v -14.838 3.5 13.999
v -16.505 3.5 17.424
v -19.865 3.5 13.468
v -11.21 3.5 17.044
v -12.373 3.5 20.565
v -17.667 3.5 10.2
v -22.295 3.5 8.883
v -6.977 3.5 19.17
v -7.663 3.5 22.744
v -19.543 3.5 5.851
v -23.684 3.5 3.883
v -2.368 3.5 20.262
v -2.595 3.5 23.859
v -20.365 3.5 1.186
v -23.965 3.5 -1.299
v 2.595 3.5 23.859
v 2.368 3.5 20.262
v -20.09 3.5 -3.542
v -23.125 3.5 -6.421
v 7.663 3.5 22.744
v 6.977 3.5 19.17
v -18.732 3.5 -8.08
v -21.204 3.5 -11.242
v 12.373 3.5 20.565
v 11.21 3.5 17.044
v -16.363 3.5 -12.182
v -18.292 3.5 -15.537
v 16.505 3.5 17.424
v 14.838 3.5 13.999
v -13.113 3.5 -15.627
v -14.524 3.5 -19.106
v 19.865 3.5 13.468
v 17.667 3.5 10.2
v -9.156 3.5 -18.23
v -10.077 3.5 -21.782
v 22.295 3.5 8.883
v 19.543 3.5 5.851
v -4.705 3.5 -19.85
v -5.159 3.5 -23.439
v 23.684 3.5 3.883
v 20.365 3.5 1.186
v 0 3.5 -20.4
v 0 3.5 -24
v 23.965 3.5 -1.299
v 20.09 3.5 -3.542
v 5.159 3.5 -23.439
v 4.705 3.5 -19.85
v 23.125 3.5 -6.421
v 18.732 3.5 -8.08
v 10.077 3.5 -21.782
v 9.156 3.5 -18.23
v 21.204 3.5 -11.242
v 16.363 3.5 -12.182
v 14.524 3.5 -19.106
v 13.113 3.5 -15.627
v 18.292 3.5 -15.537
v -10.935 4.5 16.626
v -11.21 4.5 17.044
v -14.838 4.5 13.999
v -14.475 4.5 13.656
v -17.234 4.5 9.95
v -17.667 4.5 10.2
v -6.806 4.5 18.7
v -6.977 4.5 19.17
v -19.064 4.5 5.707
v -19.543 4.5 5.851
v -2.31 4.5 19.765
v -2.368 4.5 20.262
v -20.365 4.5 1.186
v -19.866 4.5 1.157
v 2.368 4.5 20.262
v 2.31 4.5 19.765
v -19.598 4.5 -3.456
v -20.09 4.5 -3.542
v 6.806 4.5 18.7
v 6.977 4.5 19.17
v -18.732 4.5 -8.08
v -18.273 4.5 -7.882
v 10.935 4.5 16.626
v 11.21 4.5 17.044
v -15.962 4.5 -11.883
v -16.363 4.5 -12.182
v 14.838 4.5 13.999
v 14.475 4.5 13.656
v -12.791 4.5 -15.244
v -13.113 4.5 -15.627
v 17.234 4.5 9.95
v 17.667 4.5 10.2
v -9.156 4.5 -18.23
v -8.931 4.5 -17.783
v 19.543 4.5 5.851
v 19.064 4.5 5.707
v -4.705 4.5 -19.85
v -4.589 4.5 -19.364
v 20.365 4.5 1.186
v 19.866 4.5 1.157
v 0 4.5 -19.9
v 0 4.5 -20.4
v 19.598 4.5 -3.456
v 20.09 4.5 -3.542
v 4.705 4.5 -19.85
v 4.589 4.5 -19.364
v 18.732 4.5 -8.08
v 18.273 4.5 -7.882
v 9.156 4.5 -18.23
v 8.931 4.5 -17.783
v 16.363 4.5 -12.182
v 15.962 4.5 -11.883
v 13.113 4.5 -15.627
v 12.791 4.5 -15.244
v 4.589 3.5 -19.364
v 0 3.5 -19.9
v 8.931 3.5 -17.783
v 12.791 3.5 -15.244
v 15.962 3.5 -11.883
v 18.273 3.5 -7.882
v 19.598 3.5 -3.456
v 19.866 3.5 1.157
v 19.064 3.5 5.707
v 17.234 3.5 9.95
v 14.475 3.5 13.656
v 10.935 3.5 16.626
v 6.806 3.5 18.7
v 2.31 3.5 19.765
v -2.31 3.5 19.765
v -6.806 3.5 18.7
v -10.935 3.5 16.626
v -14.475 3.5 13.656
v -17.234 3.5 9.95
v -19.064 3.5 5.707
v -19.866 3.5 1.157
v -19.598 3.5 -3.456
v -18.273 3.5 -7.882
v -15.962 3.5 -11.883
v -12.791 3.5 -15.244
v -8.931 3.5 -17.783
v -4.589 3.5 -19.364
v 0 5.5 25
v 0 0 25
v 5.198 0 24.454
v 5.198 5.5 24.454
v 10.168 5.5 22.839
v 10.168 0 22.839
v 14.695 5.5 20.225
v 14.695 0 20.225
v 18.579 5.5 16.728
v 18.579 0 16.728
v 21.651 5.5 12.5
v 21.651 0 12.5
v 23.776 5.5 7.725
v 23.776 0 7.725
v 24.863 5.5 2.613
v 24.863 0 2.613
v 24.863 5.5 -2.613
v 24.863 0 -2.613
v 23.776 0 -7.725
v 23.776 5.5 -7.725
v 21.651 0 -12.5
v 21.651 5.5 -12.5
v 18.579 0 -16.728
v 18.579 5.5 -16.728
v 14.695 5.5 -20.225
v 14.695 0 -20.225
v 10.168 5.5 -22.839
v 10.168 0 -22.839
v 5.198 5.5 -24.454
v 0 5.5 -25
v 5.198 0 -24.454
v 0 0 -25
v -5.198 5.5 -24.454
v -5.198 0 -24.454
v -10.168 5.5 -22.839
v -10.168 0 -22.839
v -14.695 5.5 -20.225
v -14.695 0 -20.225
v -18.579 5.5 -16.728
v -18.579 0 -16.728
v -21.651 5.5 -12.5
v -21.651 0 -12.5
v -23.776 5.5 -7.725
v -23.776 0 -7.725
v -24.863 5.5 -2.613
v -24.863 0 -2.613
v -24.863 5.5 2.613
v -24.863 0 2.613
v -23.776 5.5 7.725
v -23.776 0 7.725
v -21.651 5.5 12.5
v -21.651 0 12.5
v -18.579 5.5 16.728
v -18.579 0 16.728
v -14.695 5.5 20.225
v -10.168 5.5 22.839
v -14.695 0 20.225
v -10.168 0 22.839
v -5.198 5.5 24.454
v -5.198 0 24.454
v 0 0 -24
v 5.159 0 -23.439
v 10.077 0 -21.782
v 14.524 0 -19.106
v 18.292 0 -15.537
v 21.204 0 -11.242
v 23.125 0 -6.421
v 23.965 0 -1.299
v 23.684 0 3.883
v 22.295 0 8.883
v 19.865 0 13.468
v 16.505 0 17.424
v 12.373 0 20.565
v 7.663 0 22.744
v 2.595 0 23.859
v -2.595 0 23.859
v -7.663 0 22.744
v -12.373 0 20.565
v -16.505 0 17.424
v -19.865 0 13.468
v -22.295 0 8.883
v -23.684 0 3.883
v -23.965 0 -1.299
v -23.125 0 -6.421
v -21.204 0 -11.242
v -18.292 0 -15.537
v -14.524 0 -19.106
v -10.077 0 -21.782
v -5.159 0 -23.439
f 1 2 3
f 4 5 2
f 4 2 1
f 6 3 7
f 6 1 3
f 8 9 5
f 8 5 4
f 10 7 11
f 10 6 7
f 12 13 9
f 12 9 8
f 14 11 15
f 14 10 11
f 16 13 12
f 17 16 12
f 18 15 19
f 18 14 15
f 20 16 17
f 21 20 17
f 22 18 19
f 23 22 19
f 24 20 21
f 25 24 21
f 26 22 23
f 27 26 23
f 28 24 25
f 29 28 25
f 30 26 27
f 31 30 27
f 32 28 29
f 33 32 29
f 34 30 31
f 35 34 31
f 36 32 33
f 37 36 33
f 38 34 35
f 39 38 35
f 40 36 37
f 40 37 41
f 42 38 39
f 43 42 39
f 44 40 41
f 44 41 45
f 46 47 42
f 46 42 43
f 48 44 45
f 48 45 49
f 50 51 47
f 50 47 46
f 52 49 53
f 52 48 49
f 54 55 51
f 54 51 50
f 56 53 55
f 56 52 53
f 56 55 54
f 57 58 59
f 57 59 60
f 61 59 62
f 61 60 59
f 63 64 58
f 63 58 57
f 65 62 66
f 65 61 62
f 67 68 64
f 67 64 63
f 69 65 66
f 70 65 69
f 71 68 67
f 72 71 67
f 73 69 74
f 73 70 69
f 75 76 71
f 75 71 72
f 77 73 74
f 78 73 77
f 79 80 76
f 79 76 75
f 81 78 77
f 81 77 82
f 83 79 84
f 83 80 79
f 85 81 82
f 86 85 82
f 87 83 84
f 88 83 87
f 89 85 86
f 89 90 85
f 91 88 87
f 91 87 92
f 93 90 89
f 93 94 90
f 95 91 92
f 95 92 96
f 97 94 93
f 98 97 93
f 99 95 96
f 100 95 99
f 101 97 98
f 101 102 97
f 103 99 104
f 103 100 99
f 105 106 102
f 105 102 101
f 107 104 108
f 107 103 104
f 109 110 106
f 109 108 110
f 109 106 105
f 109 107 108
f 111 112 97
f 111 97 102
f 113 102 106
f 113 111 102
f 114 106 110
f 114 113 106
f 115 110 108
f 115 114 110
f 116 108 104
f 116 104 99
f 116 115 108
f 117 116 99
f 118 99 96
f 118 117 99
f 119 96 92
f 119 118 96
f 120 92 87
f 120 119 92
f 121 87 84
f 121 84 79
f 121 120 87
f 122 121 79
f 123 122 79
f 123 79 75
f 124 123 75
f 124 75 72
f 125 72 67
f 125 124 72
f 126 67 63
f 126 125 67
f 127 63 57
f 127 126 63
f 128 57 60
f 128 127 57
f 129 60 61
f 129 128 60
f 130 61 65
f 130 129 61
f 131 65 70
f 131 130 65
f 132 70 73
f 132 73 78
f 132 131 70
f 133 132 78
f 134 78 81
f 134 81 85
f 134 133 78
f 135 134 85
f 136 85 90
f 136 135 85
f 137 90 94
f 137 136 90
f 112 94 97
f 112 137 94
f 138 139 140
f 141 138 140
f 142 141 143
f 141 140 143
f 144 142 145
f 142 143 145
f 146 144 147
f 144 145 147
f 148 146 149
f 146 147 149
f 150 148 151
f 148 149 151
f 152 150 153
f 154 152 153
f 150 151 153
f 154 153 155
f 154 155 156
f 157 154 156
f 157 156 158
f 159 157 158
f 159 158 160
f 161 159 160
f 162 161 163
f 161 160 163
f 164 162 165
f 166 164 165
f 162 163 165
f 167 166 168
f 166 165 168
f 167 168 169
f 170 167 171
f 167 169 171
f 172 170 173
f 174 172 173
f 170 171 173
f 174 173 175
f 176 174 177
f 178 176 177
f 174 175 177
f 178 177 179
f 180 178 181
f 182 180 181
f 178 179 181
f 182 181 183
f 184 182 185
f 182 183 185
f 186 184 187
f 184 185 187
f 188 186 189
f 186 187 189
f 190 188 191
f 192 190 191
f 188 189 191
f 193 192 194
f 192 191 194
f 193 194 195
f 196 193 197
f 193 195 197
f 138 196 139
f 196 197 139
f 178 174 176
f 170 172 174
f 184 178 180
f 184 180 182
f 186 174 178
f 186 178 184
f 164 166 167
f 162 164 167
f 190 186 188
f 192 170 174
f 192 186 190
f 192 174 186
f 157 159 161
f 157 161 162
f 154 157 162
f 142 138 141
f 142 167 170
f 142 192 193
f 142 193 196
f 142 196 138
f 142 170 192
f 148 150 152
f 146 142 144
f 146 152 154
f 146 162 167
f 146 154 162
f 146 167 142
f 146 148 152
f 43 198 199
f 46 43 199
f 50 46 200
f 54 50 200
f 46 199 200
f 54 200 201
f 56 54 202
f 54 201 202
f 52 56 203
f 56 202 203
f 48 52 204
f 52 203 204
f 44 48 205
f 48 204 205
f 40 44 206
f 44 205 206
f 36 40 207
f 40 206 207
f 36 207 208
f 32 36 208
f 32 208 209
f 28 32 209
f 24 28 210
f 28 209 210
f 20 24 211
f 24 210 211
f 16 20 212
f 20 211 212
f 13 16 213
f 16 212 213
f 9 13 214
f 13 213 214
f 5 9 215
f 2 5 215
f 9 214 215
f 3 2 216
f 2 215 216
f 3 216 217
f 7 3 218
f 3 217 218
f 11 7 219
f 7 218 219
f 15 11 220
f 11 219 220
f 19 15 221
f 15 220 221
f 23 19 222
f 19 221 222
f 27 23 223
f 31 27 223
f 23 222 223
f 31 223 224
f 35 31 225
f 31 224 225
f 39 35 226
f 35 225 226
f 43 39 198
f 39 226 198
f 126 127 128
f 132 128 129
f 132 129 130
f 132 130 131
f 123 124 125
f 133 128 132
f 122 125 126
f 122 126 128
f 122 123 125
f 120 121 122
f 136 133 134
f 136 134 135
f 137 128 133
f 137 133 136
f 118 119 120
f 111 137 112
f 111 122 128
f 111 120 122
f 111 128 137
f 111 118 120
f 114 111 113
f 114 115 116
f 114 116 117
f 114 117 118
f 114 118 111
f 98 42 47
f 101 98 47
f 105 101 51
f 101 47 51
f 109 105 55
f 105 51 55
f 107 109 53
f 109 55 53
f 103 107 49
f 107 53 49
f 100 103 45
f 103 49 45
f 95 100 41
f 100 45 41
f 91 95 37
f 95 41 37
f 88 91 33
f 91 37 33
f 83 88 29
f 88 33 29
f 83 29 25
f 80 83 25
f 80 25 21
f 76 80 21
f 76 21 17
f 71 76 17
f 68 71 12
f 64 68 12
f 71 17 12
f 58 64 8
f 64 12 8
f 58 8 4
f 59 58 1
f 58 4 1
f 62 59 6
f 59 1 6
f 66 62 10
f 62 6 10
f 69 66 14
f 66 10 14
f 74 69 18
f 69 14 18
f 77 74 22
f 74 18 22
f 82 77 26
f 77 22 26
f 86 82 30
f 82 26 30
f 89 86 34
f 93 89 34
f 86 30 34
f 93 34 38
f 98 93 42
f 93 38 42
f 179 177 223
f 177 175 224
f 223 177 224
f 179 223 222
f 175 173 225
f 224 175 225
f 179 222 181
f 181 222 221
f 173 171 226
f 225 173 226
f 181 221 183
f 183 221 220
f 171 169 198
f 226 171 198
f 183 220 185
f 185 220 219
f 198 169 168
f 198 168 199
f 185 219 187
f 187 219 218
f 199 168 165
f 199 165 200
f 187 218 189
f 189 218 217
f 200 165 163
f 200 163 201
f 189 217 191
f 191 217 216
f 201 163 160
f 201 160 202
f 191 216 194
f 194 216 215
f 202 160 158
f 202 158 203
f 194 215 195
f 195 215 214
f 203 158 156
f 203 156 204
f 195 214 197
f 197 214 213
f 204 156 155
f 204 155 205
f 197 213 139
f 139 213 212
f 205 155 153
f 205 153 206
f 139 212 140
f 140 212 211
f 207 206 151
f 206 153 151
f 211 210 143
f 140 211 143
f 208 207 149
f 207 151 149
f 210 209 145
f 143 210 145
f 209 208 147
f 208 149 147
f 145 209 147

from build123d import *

# Parameters (mm, degrees)
SKETCH1_R           = 25
BOSS_EXTRUDE1_DEPTH = 5.5
SKETCH2_R           = 24
CUT_EXTRUDE1_DEPTH  = 3.5
SKETCH3_R           = 20.4
SKETCH3_R_2         = 19.9
CUT_EXTRUDE2_DEPTH  = 1


with BuildPart() as part:
    # Sketch1 → Boss-Extrude1 (new body)
    with BuildSketch(Plane(origin=(0, 0, 0), x_dir=(1, 0, 0), z_dir=(0, 1, 0))):
        with Locations(Location((0, 0, 0), (0, 0, 270))):
            Circle(SKETCH1_R)
    extrude(amount=BOSS_EXTRUDE1_DEPTH)

    # Sketch2 → Cut-Extrude1 (cut)
    with BuildSketch(Plane.XZ):
        with Locations(Location((0, 0, 0), (0, 0, 270))):
            Circle(SKETCH2_R)
    extrude(amount=-CUT_EXTRUDE1_DEPTH, mode=Mode.SUBTRACT)

    # Sketch3 → Cut-Extrude2 (cut)
    with BuildSketch(Plane(origin=(0, 3.5, 0), x_dir=(-1, 0, 0), z_dir=(0, -1, 0))):
        with Locations(Location((0, 0, 0), (0, 0, 90))):
            Circle(SKETCH3_R)
        with Locations(Location((0, 0, 0), (0, 0, 90))):
            Circle(SKETCH3_R_2, mode=Mode.SUBTRACT)
    extrude(amount=-CUT_EXTRUDE2_DEPTH, mode=Mode.SUBTRACT)


solid = part.part
